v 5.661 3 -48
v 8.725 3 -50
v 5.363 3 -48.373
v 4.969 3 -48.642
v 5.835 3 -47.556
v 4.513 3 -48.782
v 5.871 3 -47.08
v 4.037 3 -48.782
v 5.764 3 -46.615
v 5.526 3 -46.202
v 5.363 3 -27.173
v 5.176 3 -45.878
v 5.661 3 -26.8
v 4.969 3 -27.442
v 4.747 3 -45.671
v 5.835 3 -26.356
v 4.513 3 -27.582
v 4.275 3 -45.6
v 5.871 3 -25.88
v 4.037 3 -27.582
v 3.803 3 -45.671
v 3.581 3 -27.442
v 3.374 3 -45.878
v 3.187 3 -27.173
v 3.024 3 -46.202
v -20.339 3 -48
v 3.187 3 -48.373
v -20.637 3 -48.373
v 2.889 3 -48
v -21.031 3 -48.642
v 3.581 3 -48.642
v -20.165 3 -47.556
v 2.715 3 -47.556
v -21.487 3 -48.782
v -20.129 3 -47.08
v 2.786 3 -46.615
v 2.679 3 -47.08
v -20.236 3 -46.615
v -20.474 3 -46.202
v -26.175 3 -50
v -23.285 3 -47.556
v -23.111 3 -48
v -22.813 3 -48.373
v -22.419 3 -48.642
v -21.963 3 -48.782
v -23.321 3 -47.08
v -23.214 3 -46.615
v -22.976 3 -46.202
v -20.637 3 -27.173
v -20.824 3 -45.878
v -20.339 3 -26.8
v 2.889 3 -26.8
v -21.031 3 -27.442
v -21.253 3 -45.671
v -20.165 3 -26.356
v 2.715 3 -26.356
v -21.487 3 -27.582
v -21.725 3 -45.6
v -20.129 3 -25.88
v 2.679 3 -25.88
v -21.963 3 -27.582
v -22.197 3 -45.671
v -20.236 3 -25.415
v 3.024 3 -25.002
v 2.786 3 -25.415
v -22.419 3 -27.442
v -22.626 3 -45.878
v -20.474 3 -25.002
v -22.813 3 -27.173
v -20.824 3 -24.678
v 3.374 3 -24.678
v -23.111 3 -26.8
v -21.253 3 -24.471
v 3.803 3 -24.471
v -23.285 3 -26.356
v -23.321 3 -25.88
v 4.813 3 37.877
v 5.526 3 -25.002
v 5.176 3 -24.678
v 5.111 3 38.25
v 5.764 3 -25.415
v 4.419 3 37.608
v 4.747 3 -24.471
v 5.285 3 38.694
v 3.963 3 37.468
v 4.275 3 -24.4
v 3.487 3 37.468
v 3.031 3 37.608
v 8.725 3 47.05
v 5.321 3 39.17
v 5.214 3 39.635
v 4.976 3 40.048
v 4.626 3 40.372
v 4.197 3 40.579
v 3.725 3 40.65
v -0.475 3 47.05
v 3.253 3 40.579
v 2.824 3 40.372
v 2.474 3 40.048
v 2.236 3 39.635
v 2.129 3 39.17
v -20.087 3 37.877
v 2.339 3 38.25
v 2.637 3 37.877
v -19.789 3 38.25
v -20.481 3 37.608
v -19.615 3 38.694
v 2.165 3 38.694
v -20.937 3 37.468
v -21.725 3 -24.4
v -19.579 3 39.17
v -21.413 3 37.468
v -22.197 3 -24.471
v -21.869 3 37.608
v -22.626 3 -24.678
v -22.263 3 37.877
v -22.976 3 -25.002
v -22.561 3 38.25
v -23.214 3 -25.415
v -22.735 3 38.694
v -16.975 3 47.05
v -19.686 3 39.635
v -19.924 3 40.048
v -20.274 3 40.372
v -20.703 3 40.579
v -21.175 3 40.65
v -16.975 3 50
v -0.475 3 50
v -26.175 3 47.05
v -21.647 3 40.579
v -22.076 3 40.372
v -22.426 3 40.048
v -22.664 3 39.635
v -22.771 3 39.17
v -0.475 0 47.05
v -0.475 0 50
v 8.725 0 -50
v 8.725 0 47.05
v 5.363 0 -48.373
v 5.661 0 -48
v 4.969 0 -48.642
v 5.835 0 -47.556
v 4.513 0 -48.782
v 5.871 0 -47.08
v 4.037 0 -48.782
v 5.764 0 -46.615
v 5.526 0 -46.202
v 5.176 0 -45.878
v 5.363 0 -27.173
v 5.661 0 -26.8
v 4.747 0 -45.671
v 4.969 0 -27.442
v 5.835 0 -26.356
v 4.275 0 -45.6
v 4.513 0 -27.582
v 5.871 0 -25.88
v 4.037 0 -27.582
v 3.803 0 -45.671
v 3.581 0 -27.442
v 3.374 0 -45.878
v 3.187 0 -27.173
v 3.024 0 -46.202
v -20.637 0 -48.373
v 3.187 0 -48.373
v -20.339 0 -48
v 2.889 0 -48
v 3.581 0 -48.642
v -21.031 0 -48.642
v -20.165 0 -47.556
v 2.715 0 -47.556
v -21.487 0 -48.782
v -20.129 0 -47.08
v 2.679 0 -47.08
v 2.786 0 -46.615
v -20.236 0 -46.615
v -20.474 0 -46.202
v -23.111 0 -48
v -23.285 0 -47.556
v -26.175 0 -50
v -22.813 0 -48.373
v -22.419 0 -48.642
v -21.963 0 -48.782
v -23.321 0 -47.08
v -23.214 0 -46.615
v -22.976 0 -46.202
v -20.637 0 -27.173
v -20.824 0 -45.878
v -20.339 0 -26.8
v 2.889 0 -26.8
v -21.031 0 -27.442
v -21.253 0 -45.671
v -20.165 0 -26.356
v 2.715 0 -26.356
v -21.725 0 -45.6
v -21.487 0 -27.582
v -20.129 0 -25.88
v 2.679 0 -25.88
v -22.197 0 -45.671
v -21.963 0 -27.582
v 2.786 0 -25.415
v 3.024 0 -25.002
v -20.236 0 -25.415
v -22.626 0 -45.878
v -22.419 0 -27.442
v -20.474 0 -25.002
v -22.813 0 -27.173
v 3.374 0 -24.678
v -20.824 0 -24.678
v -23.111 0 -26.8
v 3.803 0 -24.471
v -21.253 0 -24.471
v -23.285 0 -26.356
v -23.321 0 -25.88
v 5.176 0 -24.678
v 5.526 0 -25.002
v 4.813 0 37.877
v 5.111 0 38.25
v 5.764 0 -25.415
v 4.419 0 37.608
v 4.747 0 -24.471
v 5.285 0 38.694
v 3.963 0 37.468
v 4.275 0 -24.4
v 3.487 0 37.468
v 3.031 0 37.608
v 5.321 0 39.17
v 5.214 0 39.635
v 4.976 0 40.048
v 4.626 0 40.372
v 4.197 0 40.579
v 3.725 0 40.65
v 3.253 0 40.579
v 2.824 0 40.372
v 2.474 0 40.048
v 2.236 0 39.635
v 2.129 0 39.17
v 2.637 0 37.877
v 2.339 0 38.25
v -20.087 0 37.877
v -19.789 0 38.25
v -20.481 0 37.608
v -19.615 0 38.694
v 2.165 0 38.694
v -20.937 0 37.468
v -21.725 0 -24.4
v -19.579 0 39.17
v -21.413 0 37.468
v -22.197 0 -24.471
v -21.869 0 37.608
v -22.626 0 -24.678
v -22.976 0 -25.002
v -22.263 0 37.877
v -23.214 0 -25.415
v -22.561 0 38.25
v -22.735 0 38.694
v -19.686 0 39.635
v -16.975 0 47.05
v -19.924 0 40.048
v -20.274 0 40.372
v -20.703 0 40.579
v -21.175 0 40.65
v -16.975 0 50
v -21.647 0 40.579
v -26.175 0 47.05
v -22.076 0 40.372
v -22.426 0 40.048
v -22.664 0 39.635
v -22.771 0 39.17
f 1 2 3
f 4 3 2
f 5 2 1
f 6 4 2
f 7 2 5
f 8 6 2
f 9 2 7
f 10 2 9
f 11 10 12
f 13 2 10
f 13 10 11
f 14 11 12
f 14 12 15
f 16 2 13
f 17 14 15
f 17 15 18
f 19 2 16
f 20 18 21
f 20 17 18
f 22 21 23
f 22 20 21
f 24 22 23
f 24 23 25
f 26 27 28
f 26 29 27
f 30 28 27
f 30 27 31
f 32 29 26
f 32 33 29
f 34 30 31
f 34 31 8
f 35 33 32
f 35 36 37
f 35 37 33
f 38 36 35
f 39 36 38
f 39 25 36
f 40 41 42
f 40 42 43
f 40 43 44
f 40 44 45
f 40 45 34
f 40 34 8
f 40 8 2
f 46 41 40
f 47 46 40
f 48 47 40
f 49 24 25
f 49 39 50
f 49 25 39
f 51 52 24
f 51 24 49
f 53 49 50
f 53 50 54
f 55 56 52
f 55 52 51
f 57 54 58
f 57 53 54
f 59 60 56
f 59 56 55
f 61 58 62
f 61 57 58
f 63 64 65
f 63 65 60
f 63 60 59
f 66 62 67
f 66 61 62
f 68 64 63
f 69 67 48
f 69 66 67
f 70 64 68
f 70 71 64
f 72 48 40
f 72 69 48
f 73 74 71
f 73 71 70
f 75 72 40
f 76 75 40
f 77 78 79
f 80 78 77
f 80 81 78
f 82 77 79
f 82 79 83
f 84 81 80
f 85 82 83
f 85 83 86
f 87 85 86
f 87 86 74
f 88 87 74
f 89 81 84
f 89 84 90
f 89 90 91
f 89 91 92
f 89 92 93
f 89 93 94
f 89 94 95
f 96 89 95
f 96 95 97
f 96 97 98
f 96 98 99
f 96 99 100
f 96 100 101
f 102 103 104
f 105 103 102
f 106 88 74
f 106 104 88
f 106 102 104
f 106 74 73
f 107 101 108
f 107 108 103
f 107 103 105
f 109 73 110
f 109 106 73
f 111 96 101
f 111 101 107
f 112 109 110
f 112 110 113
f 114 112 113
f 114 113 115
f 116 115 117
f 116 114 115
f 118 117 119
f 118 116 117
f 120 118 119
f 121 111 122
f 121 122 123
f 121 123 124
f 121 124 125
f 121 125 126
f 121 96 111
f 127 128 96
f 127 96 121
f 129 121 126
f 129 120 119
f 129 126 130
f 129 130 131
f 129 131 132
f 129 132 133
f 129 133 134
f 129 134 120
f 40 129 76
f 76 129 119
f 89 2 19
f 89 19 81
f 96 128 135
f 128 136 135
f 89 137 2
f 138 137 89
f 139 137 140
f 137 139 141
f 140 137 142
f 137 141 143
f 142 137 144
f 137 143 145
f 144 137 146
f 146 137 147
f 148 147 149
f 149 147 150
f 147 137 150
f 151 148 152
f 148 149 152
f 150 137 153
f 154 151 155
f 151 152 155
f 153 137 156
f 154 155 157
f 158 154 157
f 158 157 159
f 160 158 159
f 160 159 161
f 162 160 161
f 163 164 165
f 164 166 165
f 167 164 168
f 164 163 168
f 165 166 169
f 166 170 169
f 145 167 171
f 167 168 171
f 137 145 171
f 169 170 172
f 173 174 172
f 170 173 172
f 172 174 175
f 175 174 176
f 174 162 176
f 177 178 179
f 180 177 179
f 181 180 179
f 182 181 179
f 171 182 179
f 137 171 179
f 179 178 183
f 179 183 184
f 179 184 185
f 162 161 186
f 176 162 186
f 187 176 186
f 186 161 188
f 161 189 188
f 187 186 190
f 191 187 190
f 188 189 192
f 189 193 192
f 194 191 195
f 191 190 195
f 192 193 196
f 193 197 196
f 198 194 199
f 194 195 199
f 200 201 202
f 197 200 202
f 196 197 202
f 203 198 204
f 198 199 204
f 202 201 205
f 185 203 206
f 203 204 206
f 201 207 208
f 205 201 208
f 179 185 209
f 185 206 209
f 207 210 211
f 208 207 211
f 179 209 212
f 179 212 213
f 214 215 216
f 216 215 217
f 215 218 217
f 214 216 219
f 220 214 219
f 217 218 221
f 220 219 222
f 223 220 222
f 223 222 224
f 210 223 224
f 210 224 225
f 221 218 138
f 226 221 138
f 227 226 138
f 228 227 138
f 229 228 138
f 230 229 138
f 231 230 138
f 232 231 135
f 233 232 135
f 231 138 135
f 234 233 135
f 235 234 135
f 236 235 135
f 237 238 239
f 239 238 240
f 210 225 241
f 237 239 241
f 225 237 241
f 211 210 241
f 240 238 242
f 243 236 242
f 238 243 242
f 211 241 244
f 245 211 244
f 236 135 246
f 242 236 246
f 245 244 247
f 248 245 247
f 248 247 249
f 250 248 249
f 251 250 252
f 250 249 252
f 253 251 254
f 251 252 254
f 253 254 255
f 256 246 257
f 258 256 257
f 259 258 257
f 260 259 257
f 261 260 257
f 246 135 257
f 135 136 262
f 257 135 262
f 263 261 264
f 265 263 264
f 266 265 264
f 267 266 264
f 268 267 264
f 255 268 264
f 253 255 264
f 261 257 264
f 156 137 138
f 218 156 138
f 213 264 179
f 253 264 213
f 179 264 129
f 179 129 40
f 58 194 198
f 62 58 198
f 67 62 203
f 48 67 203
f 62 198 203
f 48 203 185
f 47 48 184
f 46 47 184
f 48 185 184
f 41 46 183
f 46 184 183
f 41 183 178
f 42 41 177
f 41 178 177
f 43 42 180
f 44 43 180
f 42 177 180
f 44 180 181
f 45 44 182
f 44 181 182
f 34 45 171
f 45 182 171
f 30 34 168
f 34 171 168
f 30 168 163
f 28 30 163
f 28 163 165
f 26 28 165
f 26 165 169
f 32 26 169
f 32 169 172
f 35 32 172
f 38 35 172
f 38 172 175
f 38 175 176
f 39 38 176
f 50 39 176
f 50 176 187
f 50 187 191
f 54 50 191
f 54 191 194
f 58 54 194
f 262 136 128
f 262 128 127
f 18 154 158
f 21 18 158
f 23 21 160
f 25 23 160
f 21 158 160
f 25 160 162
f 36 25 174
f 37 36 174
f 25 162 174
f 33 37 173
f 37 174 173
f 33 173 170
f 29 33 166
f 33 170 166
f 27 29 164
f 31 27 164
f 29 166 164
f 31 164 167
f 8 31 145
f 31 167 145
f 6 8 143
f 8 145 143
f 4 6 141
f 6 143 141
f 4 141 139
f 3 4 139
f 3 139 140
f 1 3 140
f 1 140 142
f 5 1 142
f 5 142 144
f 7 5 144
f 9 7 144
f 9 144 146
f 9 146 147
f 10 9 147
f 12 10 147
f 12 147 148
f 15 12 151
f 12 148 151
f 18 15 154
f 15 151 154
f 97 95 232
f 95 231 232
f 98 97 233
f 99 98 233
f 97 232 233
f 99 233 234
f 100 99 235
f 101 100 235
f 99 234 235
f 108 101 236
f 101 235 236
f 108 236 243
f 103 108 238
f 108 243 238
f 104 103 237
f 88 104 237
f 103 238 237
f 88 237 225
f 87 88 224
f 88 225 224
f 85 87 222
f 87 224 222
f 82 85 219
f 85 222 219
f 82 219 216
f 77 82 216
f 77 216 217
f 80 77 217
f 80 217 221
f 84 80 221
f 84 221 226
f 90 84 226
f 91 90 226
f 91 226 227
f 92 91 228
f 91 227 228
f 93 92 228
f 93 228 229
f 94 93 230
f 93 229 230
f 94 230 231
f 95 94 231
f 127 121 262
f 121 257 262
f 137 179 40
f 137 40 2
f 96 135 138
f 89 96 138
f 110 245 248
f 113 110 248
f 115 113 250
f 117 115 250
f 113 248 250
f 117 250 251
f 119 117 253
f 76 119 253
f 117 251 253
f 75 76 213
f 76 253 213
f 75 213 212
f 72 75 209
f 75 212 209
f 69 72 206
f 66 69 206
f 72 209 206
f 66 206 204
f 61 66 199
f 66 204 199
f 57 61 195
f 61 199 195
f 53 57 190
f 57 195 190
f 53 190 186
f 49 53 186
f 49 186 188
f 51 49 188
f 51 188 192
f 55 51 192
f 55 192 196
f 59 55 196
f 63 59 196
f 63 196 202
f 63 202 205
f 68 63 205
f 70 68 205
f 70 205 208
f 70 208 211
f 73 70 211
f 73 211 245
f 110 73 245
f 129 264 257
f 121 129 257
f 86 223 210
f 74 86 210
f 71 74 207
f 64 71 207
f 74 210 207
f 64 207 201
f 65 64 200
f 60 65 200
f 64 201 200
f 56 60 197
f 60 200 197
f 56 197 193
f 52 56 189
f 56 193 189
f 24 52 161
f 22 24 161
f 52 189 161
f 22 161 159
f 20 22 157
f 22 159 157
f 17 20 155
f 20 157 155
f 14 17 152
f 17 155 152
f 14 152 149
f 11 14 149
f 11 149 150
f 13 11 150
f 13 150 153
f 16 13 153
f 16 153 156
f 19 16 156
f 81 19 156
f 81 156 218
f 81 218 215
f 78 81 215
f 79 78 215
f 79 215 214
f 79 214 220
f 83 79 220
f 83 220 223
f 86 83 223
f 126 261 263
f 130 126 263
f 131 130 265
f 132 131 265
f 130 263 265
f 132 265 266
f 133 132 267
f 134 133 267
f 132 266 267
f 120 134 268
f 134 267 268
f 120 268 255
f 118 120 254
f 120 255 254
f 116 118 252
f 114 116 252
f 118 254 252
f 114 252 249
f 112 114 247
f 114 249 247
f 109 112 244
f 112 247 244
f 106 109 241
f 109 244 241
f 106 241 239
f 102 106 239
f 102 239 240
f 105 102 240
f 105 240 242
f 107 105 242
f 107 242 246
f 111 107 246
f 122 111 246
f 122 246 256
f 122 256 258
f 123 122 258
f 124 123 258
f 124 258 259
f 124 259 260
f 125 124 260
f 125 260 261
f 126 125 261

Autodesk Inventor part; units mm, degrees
ref_plane "YZ Plane" through (0, 0, 0) normal (1, 0, 0) x (0, 1, 0)
ref_plane "XZ Plane" through (0, 0, 0) normal (0, 1, 0) x (-1, 0, 0)
ref_plane "XY Plane" through (0, 0, 0) normal (0, 0, 1) x (1, 0, 0)
sketch "Эскиз1" plane through (0, 0, 0) normal (0, 1, 0) x (-1, 0, 0)
  line L0 (-8.725, 50) -> (8.725, 50)
  line L1 (8.725, 50) -> (8.725, -50)
  line L2 (8.725, -50) -> (-8.725, -50)
  line L3 (-8.725, -50) -> (-8.725, 50)
  line L4 (-8.725, 50) -> (8.725, -50) construction
  line L5 (8.725, 50) -> (-8.725, -50) construction
  line L6 (-8.725, 50) -> (0.475, 50)
  line L7 (0.475, 50) -> (0.475, 47.05)
  line L8 (0.475, 47.05) -> (-8.725, 47.05)
  line L9 (-8.725, 47.05) -> (-8.725, 50)
  point P0 (0, 0)
  point P1 (0.475, 50)
  dimension "d0" = 17.45
  dimension "d1" = 100
  dimension "d13" = 9.2
  dimension "d14" = 2.95
extrude "Выдавливание1" add sketch "Эскиз1" along normal blind 3 contours L0 L1 L2 L3 L8 L7
mirror "Зеркальное отражение1" about plane through (-8.725, 0, -50) normal (-1, 0, 0)
sketch "Эскиз2" plane through (0, 3, 0) normal (0, 1, 0) x (1, 0, 0)
  line L0 (-8.725, -50) -> (-8.725, -39.05) construction
  line L1 (-21.175, -39.05) -> (3.725, -39.05)
  line L2 (-0.475, -50) -> (-16.975, -50) projected
  line L3 (-21.725, 47.2) -> (4.275, 47.2)
  line L4 (-21.725, 26) -> (4.275, 26)
  line L5 (-8.725, 26) -> (-8.725, 47.2)
  line L6 (-8.725, 47.2) -> (-8.725, 50)
  line L7 (8.725, 50) -> (-26.175, 50) projected
  dimension "d4" = 10.95
  dimension "d5" = 24.9
  dimension "d15" = 26
  dimension "d16" = 2.8
  dimension "d17" = 21.2
hole "Отверстие1" at (3.725, 3, 39.05) at (-21.175, 3, 39.05) at (-21.725, 3, -26) at (4.275, 3, -26) at (4.275, 3, -47.2) at (-21.725, 3, -47.2) direction (0, -1, 0) diameter 3.2 end through all
properties part number "Basis of the robot"
